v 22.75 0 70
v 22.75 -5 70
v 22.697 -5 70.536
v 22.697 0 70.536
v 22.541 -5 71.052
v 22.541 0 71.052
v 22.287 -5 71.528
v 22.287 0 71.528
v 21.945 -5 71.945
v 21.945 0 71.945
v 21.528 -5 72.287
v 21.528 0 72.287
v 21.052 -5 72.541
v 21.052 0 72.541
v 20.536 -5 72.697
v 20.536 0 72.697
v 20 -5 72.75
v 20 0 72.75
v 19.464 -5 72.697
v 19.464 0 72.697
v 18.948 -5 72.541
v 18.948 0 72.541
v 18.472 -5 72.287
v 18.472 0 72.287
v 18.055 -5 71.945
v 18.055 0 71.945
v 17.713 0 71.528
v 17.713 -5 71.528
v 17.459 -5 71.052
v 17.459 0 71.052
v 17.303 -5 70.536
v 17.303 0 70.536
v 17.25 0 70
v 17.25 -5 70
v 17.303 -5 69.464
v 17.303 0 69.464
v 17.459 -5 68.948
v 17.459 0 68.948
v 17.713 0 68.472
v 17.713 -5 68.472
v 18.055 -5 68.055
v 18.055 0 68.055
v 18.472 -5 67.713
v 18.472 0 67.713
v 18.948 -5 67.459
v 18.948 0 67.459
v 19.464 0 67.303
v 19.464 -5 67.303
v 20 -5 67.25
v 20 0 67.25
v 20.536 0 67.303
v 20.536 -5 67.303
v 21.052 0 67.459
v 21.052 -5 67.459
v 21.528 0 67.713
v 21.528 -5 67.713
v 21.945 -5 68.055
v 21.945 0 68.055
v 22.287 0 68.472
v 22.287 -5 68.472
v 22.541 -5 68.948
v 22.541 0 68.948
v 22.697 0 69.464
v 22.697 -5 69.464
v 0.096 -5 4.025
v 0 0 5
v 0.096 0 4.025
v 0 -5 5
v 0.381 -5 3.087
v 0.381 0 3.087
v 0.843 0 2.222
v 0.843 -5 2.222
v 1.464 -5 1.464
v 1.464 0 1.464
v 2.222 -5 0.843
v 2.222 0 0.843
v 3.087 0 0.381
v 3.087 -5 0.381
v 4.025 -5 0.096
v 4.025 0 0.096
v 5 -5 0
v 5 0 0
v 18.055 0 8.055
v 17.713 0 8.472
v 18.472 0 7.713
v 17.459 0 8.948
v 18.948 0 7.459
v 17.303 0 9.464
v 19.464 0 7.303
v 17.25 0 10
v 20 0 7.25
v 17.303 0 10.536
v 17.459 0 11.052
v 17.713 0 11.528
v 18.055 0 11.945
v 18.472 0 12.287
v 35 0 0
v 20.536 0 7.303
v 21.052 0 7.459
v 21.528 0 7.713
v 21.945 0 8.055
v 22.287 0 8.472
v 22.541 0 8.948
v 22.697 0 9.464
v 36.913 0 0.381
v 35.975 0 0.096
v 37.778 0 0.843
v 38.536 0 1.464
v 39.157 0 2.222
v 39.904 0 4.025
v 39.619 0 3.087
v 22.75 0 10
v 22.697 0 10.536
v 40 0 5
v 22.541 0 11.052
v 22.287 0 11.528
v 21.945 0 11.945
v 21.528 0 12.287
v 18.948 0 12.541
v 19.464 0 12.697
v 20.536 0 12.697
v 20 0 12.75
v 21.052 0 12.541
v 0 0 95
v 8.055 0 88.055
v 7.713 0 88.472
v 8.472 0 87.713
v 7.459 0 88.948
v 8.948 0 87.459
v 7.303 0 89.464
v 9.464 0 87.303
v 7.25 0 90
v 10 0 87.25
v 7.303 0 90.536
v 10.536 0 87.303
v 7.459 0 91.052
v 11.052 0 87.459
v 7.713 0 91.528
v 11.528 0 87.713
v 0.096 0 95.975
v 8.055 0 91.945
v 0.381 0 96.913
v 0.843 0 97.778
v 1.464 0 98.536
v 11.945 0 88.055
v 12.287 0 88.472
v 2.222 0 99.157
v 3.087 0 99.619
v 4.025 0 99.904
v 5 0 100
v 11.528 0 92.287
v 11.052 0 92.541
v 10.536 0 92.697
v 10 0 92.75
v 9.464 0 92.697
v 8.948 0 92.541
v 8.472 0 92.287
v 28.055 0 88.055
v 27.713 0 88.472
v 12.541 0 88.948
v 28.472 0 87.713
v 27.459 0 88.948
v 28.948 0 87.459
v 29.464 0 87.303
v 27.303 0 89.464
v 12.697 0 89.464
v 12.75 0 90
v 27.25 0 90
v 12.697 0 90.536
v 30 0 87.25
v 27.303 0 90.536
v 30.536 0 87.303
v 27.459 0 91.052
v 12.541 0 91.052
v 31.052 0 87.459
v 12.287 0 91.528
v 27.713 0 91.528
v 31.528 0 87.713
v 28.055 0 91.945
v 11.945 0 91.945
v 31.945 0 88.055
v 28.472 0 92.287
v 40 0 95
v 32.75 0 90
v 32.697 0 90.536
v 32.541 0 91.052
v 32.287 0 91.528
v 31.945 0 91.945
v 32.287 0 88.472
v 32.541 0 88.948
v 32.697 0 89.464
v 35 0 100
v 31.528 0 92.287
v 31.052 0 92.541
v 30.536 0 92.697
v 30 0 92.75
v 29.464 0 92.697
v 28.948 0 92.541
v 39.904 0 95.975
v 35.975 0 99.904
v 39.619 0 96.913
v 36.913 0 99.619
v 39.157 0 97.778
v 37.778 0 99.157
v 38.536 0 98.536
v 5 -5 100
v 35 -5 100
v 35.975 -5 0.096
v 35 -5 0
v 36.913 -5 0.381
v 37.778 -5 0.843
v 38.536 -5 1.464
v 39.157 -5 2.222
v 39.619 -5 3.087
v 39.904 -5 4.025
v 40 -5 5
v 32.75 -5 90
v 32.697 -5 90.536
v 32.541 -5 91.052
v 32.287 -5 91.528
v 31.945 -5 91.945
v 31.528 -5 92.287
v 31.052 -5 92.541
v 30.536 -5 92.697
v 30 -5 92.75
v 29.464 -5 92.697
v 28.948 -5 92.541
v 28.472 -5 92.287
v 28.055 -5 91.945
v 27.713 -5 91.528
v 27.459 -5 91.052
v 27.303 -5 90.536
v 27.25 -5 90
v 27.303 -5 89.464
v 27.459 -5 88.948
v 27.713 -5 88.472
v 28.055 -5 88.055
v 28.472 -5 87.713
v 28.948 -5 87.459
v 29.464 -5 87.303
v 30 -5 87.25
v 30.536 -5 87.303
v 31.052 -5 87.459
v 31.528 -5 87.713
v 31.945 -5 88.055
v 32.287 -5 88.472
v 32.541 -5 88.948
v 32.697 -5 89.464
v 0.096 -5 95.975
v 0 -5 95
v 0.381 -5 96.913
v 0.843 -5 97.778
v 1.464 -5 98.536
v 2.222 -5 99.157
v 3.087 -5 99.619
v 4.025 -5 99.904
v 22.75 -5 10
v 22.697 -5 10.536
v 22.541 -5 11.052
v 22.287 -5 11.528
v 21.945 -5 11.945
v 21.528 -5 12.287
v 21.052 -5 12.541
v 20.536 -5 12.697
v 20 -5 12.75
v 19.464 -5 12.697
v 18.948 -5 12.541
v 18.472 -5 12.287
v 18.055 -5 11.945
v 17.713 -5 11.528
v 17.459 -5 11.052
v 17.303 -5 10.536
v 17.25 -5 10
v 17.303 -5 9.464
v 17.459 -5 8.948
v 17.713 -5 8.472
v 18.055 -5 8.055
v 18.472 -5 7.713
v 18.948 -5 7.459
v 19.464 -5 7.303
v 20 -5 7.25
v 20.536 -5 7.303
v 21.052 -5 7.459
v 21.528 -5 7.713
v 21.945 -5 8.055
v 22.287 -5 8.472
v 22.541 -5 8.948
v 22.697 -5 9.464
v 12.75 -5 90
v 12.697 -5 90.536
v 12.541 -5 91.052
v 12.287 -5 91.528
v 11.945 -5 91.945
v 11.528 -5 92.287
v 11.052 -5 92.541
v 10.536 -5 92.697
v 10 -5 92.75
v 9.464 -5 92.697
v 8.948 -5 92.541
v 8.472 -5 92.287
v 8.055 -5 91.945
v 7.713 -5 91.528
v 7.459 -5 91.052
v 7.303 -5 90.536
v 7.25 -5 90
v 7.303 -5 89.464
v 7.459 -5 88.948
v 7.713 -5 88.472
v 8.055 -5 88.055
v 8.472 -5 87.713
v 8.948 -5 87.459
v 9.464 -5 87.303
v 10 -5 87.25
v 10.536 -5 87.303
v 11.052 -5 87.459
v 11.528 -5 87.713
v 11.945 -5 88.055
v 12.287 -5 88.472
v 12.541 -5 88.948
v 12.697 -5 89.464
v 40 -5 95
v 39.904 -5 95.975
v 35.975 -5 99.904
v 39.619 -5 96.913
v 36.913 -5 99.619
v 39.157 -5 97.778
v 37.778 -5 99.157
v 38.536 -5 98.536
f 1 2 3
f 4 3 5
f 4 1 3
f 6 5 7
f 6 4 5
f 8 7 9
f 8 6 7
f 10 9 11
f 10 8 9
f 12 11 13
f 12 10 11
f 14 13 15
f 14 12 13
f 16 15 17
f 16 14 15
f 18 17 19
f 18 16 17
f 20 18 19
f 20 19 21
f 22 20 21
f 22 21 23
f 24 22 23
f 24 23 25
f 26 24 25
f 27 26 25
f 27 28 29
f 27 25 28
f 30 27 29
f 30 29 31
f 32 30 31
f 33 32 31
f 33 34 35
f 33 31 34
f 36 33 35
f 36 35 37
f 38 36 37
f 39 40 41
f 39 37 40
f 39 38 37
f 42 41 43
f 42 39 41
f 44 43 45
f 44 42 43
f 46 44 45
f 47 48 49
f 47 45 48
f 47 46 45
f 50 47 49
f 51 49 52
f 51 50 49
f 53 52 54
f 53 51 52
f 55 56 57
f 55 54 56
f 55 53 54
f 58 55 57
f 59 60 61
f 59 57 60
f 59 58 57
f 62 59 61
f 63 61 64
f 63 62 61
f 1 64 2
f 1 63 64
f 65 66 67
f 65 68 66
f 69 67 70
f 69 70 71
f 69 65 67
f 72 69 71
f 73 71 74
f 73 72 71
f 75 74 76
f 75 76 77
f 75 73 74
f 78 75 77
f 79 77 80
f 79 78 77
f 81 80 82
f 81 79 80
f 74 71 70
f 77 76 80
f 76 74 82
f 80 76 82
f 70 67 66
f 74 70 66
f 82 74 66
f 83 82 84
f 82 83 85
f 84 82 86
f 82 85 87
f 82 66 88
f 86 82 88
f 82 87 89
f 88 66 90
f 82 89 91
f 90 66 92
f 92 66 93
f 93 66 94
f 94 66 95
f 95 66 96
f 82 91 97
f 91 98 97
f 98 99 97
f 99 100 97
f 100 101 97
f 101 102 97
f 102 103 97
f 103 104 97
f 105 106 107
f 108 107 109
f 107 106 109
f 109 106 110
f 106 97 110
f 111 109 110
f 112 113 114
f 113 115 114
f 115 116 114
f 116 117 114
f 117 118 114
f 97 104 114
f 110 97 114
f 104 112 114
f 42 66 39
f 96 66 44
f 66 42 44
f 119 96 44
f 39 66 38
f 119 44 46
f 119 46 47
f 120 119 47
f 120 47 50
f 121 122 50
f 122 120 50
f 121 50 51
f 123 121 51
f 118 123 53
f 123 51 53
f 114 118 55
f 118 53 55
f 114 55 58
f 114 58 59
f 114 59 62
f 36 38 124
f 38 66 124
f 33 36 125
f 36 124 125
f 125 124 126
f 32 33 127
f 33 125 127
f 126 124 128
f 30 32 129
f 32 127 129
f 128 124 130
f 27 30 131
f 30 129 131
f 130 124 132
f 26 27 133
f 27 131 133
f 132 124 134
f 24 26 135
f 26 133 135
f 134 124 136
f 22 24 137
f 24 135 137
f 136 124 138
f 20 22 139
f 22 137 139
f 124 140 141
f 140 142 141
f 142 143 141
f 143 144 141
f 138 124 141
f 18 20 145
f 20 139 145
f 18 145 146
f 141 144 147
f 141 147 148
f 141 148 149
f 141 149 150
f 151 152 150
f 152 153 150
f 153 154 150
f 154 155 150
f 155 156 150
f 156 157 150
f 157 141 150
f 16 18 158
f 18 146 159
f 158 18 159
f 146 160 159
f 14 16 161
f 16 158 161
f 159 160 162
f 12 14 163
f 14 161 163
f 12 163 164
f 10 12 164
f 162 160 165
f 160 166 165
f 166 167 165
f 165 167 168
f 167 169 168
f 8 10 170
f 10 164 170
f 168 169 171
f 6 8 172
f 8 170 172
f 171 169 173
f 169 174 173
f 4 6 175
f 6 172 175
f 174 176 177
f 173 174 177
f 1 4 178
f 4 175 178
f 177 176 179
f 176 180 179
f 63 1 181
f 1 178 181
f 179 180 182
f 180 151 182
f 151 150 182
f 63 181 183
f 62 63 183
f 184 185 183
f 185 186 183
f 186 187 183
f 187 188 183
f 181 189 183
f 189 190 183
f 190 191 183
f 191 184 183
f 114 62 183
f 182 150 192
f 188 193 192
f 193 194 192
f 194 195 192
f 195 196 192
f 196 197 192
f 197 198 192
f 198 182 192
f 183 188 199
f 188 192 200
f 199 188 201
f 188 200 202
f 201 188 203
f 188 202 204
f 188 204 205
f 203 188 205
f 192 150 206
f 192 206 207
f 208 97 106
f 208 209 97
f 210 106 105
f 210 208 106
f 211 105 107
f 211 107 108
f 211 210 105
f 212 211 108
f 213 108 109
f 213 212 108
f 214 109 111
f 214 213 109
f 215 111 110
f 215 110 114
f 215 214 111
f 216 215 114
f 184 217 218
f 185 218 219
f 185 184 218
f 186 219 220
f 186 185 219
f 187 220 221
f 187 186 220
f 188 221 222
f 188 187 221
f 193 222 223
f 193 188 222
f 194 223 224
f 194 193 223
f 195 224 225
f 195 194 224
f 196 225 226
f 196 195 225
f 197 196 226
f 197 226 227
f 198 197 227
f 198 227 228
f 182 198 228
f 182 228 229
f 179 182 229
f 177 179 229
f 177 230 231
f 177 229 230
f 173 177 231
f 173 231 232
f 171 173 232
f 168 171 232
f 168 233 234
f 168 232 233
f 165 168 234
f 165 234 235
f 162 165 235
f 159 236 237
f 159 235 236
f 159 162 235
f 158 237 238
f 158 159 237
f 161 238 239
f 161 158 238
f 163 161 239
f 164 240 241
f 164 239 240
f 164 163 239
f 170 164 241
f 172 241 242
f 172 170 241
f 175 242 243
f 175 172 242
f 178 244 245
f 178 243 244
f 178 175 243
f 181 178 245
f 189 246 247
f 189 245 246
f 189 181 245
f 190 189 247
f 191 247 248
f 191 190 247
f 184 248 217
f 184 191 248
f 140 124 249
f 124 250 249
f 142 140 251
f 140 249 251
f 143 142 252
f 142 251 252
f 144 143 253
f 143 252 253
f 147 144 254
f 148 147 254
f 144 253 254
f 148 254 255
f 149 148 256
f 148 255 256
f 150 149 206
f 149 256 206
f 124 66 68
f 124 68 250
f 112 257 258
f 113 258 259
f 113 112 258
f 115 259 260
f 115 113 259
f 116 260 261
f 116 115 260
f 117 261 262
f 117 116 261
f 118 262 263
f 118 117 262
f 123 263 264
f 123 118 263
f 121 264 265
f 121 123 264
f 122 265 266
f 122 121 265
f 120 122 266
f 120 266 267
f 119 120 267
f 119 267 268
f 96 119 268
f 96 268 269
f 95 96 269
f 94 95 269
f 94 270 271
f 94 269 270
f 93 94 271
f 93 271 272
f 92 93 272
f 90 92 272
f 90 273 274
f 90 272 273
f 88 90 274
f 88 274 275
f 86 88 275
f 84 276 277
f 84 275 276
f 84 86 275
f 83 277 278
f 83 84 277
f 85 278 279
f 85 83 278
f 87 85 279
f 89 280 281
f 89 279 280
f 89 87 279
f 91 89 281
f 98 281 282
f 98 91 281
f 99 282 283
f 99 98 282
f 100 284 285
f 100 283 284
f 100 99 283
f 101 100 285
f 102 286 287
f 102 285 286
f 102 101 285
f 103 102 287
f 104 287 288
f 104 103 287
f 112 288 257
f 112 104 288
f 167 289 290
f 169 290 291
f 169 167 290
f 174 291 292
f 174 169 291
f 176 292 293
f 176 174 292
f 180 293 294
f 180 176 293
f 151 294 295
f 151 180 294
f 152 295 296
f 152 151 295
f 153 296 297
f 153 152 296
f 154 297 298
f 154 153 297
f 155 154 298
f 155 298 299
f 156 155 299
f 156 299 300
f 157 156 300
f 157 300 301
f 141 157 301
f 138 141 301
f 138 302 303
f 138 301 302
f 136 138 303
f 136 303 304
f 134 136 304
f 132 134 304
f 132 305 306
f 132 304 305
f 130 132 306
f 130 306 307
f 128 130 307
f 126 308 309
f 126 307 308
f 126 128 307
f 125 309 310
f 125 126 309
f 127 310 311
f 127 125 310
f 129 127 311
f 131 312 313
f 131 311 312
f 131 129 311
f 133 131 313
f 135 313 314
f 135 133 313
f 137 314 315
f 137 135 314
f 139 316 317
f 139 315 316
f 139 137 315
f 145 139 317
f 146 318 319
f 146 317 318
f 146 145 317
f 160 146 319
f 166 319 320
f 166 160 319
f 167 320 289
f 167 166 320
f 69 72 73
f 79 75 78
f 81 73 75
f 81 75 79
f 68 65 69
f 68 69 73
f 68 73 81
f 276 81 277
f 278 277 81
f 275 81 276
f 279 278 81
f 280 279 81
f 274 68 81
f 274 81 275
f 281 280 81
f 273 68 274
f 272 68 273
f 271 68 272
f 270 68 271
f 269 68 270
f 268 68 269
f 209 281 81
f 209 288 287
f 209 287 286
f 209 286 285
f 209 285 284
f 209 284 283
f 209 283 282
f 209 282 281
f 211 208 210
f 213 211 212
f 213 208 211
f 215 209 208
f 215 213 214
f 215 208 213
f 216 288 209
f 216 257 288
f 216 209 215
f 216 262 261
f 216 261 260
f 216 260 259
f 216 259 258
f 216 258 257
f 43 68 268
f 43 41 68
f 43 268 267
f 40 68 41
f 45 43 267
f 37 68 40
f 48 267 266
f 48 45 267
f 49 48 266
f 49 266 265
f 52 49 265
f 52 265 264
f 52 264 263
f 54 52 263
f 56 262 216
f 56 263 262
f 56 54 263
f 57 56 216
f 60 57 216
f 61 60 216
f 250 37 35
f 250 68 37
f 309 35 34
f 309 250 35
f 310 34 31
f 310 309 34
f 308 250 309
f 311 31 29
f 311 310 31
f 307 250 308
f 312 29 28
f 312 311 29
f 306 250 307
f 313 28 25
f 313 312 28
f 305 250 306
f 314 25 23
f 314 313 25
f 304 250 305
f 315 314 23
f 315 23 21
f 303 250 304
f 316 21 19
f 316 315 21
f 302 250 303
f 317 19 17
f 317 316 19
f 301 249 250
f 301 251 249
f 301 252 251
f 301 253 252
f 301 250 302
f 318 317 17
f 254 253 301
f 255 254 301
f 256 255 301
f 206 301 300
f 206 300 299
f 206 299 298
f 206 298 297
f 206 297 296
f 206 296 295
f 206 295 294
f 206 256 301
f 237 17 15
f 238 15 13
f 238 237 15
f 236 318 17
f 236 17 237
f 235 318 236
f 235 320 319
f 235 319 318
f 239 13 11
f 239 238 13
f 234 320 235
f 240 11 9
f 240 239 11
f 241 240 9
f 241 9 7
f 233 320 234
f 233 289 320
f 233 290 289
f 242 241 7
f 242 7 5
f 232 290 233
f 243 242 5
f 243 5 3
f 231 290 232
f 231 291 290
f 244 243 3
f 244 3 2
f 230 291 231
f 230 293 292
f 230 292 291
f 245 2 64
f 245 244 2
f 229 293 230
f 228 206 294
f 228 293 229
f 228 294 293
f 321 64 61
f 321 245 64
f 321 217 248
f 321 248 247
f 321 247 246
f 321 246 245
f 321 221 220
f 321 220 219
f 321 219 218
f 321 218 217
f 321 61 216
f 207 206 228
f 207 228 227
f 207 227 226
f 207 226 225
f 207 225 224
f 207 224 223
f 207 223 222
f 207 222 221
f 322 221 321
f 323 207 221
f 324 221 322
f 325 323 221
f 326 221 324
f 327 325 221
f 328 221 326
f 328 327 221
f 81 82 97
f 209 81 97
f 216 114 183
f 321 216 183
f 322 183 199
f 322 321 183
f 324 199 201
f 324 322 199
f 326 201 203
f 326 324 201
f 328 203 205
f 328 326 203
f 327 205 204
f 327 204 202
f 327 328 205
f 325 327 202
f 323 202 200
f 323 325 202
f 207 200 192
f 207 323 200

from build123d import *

# Parameters (mm, degrees)
F0_W     = 40
F0_H     = 100
F1_DEPTH = 5
F2_R     = 5
F3_R     = 2.75
F4_DEPTH = 5.001


with BuildPart() as f1:
    # F0 (on Front) → F1 (new body)
    with BuildSketch(Plane.XZ):
        with Locations((20, 50)):
            Rectangle(F0_W, F0_H)
    extrude(amount=F1_DEPTH)

    # F2
    f2_edges = [f1.edges().sort_by_distance(p)[0] for p in [
        (0, -2.5, 100),
        (40, -2.5, 100),
        (40, -2.5, 0),
        (0, -2.5, 0),
    ]]
    fillet(f2_edges, radius=F2_R)


with BuildPart() as f4:
    # F3 (on Front) → F4 (new body, through all)
    with BuildSketch(Plane.XZ):
        with Locations((20, 10)):
            Circle(F3_R)
    extrude(amount=F4_DEPTH)


with BuildPart() as f1_1:
    add(f1.part)

    # F5: cut F4
    add(f4.part, mode=Mode.SUBTRACT)


with BuildPart() as f6_1:
    # F6: copy of F4
    add(f4.part.moved(Location((0, 0, 60))))


with BuildPart() as f7_1:
    # F7: copy of F6_1
    add(f6_1.part.moved(Location((10, 0, 20))))


with BuildPart() as f8_1:
    # F8: copy of F6_1
    add(f6_1.part.moved(Location((-10, 0, 20))))


with BuildPart() as f1_2:
    add(f1_1.part)

    # F9: cut F8_1, F7_1, F6_1, F4
    add(f8_1.part, mode=Mode.SUBTRACT)
    add(f7_1.part, mode=Mode.SUBTRACT)
    add(f6_1.part, mode=Mode.SUBTRACT)
    add(f4.part, mode=Mode.SUBTRACT)


solid = f1_2.part
